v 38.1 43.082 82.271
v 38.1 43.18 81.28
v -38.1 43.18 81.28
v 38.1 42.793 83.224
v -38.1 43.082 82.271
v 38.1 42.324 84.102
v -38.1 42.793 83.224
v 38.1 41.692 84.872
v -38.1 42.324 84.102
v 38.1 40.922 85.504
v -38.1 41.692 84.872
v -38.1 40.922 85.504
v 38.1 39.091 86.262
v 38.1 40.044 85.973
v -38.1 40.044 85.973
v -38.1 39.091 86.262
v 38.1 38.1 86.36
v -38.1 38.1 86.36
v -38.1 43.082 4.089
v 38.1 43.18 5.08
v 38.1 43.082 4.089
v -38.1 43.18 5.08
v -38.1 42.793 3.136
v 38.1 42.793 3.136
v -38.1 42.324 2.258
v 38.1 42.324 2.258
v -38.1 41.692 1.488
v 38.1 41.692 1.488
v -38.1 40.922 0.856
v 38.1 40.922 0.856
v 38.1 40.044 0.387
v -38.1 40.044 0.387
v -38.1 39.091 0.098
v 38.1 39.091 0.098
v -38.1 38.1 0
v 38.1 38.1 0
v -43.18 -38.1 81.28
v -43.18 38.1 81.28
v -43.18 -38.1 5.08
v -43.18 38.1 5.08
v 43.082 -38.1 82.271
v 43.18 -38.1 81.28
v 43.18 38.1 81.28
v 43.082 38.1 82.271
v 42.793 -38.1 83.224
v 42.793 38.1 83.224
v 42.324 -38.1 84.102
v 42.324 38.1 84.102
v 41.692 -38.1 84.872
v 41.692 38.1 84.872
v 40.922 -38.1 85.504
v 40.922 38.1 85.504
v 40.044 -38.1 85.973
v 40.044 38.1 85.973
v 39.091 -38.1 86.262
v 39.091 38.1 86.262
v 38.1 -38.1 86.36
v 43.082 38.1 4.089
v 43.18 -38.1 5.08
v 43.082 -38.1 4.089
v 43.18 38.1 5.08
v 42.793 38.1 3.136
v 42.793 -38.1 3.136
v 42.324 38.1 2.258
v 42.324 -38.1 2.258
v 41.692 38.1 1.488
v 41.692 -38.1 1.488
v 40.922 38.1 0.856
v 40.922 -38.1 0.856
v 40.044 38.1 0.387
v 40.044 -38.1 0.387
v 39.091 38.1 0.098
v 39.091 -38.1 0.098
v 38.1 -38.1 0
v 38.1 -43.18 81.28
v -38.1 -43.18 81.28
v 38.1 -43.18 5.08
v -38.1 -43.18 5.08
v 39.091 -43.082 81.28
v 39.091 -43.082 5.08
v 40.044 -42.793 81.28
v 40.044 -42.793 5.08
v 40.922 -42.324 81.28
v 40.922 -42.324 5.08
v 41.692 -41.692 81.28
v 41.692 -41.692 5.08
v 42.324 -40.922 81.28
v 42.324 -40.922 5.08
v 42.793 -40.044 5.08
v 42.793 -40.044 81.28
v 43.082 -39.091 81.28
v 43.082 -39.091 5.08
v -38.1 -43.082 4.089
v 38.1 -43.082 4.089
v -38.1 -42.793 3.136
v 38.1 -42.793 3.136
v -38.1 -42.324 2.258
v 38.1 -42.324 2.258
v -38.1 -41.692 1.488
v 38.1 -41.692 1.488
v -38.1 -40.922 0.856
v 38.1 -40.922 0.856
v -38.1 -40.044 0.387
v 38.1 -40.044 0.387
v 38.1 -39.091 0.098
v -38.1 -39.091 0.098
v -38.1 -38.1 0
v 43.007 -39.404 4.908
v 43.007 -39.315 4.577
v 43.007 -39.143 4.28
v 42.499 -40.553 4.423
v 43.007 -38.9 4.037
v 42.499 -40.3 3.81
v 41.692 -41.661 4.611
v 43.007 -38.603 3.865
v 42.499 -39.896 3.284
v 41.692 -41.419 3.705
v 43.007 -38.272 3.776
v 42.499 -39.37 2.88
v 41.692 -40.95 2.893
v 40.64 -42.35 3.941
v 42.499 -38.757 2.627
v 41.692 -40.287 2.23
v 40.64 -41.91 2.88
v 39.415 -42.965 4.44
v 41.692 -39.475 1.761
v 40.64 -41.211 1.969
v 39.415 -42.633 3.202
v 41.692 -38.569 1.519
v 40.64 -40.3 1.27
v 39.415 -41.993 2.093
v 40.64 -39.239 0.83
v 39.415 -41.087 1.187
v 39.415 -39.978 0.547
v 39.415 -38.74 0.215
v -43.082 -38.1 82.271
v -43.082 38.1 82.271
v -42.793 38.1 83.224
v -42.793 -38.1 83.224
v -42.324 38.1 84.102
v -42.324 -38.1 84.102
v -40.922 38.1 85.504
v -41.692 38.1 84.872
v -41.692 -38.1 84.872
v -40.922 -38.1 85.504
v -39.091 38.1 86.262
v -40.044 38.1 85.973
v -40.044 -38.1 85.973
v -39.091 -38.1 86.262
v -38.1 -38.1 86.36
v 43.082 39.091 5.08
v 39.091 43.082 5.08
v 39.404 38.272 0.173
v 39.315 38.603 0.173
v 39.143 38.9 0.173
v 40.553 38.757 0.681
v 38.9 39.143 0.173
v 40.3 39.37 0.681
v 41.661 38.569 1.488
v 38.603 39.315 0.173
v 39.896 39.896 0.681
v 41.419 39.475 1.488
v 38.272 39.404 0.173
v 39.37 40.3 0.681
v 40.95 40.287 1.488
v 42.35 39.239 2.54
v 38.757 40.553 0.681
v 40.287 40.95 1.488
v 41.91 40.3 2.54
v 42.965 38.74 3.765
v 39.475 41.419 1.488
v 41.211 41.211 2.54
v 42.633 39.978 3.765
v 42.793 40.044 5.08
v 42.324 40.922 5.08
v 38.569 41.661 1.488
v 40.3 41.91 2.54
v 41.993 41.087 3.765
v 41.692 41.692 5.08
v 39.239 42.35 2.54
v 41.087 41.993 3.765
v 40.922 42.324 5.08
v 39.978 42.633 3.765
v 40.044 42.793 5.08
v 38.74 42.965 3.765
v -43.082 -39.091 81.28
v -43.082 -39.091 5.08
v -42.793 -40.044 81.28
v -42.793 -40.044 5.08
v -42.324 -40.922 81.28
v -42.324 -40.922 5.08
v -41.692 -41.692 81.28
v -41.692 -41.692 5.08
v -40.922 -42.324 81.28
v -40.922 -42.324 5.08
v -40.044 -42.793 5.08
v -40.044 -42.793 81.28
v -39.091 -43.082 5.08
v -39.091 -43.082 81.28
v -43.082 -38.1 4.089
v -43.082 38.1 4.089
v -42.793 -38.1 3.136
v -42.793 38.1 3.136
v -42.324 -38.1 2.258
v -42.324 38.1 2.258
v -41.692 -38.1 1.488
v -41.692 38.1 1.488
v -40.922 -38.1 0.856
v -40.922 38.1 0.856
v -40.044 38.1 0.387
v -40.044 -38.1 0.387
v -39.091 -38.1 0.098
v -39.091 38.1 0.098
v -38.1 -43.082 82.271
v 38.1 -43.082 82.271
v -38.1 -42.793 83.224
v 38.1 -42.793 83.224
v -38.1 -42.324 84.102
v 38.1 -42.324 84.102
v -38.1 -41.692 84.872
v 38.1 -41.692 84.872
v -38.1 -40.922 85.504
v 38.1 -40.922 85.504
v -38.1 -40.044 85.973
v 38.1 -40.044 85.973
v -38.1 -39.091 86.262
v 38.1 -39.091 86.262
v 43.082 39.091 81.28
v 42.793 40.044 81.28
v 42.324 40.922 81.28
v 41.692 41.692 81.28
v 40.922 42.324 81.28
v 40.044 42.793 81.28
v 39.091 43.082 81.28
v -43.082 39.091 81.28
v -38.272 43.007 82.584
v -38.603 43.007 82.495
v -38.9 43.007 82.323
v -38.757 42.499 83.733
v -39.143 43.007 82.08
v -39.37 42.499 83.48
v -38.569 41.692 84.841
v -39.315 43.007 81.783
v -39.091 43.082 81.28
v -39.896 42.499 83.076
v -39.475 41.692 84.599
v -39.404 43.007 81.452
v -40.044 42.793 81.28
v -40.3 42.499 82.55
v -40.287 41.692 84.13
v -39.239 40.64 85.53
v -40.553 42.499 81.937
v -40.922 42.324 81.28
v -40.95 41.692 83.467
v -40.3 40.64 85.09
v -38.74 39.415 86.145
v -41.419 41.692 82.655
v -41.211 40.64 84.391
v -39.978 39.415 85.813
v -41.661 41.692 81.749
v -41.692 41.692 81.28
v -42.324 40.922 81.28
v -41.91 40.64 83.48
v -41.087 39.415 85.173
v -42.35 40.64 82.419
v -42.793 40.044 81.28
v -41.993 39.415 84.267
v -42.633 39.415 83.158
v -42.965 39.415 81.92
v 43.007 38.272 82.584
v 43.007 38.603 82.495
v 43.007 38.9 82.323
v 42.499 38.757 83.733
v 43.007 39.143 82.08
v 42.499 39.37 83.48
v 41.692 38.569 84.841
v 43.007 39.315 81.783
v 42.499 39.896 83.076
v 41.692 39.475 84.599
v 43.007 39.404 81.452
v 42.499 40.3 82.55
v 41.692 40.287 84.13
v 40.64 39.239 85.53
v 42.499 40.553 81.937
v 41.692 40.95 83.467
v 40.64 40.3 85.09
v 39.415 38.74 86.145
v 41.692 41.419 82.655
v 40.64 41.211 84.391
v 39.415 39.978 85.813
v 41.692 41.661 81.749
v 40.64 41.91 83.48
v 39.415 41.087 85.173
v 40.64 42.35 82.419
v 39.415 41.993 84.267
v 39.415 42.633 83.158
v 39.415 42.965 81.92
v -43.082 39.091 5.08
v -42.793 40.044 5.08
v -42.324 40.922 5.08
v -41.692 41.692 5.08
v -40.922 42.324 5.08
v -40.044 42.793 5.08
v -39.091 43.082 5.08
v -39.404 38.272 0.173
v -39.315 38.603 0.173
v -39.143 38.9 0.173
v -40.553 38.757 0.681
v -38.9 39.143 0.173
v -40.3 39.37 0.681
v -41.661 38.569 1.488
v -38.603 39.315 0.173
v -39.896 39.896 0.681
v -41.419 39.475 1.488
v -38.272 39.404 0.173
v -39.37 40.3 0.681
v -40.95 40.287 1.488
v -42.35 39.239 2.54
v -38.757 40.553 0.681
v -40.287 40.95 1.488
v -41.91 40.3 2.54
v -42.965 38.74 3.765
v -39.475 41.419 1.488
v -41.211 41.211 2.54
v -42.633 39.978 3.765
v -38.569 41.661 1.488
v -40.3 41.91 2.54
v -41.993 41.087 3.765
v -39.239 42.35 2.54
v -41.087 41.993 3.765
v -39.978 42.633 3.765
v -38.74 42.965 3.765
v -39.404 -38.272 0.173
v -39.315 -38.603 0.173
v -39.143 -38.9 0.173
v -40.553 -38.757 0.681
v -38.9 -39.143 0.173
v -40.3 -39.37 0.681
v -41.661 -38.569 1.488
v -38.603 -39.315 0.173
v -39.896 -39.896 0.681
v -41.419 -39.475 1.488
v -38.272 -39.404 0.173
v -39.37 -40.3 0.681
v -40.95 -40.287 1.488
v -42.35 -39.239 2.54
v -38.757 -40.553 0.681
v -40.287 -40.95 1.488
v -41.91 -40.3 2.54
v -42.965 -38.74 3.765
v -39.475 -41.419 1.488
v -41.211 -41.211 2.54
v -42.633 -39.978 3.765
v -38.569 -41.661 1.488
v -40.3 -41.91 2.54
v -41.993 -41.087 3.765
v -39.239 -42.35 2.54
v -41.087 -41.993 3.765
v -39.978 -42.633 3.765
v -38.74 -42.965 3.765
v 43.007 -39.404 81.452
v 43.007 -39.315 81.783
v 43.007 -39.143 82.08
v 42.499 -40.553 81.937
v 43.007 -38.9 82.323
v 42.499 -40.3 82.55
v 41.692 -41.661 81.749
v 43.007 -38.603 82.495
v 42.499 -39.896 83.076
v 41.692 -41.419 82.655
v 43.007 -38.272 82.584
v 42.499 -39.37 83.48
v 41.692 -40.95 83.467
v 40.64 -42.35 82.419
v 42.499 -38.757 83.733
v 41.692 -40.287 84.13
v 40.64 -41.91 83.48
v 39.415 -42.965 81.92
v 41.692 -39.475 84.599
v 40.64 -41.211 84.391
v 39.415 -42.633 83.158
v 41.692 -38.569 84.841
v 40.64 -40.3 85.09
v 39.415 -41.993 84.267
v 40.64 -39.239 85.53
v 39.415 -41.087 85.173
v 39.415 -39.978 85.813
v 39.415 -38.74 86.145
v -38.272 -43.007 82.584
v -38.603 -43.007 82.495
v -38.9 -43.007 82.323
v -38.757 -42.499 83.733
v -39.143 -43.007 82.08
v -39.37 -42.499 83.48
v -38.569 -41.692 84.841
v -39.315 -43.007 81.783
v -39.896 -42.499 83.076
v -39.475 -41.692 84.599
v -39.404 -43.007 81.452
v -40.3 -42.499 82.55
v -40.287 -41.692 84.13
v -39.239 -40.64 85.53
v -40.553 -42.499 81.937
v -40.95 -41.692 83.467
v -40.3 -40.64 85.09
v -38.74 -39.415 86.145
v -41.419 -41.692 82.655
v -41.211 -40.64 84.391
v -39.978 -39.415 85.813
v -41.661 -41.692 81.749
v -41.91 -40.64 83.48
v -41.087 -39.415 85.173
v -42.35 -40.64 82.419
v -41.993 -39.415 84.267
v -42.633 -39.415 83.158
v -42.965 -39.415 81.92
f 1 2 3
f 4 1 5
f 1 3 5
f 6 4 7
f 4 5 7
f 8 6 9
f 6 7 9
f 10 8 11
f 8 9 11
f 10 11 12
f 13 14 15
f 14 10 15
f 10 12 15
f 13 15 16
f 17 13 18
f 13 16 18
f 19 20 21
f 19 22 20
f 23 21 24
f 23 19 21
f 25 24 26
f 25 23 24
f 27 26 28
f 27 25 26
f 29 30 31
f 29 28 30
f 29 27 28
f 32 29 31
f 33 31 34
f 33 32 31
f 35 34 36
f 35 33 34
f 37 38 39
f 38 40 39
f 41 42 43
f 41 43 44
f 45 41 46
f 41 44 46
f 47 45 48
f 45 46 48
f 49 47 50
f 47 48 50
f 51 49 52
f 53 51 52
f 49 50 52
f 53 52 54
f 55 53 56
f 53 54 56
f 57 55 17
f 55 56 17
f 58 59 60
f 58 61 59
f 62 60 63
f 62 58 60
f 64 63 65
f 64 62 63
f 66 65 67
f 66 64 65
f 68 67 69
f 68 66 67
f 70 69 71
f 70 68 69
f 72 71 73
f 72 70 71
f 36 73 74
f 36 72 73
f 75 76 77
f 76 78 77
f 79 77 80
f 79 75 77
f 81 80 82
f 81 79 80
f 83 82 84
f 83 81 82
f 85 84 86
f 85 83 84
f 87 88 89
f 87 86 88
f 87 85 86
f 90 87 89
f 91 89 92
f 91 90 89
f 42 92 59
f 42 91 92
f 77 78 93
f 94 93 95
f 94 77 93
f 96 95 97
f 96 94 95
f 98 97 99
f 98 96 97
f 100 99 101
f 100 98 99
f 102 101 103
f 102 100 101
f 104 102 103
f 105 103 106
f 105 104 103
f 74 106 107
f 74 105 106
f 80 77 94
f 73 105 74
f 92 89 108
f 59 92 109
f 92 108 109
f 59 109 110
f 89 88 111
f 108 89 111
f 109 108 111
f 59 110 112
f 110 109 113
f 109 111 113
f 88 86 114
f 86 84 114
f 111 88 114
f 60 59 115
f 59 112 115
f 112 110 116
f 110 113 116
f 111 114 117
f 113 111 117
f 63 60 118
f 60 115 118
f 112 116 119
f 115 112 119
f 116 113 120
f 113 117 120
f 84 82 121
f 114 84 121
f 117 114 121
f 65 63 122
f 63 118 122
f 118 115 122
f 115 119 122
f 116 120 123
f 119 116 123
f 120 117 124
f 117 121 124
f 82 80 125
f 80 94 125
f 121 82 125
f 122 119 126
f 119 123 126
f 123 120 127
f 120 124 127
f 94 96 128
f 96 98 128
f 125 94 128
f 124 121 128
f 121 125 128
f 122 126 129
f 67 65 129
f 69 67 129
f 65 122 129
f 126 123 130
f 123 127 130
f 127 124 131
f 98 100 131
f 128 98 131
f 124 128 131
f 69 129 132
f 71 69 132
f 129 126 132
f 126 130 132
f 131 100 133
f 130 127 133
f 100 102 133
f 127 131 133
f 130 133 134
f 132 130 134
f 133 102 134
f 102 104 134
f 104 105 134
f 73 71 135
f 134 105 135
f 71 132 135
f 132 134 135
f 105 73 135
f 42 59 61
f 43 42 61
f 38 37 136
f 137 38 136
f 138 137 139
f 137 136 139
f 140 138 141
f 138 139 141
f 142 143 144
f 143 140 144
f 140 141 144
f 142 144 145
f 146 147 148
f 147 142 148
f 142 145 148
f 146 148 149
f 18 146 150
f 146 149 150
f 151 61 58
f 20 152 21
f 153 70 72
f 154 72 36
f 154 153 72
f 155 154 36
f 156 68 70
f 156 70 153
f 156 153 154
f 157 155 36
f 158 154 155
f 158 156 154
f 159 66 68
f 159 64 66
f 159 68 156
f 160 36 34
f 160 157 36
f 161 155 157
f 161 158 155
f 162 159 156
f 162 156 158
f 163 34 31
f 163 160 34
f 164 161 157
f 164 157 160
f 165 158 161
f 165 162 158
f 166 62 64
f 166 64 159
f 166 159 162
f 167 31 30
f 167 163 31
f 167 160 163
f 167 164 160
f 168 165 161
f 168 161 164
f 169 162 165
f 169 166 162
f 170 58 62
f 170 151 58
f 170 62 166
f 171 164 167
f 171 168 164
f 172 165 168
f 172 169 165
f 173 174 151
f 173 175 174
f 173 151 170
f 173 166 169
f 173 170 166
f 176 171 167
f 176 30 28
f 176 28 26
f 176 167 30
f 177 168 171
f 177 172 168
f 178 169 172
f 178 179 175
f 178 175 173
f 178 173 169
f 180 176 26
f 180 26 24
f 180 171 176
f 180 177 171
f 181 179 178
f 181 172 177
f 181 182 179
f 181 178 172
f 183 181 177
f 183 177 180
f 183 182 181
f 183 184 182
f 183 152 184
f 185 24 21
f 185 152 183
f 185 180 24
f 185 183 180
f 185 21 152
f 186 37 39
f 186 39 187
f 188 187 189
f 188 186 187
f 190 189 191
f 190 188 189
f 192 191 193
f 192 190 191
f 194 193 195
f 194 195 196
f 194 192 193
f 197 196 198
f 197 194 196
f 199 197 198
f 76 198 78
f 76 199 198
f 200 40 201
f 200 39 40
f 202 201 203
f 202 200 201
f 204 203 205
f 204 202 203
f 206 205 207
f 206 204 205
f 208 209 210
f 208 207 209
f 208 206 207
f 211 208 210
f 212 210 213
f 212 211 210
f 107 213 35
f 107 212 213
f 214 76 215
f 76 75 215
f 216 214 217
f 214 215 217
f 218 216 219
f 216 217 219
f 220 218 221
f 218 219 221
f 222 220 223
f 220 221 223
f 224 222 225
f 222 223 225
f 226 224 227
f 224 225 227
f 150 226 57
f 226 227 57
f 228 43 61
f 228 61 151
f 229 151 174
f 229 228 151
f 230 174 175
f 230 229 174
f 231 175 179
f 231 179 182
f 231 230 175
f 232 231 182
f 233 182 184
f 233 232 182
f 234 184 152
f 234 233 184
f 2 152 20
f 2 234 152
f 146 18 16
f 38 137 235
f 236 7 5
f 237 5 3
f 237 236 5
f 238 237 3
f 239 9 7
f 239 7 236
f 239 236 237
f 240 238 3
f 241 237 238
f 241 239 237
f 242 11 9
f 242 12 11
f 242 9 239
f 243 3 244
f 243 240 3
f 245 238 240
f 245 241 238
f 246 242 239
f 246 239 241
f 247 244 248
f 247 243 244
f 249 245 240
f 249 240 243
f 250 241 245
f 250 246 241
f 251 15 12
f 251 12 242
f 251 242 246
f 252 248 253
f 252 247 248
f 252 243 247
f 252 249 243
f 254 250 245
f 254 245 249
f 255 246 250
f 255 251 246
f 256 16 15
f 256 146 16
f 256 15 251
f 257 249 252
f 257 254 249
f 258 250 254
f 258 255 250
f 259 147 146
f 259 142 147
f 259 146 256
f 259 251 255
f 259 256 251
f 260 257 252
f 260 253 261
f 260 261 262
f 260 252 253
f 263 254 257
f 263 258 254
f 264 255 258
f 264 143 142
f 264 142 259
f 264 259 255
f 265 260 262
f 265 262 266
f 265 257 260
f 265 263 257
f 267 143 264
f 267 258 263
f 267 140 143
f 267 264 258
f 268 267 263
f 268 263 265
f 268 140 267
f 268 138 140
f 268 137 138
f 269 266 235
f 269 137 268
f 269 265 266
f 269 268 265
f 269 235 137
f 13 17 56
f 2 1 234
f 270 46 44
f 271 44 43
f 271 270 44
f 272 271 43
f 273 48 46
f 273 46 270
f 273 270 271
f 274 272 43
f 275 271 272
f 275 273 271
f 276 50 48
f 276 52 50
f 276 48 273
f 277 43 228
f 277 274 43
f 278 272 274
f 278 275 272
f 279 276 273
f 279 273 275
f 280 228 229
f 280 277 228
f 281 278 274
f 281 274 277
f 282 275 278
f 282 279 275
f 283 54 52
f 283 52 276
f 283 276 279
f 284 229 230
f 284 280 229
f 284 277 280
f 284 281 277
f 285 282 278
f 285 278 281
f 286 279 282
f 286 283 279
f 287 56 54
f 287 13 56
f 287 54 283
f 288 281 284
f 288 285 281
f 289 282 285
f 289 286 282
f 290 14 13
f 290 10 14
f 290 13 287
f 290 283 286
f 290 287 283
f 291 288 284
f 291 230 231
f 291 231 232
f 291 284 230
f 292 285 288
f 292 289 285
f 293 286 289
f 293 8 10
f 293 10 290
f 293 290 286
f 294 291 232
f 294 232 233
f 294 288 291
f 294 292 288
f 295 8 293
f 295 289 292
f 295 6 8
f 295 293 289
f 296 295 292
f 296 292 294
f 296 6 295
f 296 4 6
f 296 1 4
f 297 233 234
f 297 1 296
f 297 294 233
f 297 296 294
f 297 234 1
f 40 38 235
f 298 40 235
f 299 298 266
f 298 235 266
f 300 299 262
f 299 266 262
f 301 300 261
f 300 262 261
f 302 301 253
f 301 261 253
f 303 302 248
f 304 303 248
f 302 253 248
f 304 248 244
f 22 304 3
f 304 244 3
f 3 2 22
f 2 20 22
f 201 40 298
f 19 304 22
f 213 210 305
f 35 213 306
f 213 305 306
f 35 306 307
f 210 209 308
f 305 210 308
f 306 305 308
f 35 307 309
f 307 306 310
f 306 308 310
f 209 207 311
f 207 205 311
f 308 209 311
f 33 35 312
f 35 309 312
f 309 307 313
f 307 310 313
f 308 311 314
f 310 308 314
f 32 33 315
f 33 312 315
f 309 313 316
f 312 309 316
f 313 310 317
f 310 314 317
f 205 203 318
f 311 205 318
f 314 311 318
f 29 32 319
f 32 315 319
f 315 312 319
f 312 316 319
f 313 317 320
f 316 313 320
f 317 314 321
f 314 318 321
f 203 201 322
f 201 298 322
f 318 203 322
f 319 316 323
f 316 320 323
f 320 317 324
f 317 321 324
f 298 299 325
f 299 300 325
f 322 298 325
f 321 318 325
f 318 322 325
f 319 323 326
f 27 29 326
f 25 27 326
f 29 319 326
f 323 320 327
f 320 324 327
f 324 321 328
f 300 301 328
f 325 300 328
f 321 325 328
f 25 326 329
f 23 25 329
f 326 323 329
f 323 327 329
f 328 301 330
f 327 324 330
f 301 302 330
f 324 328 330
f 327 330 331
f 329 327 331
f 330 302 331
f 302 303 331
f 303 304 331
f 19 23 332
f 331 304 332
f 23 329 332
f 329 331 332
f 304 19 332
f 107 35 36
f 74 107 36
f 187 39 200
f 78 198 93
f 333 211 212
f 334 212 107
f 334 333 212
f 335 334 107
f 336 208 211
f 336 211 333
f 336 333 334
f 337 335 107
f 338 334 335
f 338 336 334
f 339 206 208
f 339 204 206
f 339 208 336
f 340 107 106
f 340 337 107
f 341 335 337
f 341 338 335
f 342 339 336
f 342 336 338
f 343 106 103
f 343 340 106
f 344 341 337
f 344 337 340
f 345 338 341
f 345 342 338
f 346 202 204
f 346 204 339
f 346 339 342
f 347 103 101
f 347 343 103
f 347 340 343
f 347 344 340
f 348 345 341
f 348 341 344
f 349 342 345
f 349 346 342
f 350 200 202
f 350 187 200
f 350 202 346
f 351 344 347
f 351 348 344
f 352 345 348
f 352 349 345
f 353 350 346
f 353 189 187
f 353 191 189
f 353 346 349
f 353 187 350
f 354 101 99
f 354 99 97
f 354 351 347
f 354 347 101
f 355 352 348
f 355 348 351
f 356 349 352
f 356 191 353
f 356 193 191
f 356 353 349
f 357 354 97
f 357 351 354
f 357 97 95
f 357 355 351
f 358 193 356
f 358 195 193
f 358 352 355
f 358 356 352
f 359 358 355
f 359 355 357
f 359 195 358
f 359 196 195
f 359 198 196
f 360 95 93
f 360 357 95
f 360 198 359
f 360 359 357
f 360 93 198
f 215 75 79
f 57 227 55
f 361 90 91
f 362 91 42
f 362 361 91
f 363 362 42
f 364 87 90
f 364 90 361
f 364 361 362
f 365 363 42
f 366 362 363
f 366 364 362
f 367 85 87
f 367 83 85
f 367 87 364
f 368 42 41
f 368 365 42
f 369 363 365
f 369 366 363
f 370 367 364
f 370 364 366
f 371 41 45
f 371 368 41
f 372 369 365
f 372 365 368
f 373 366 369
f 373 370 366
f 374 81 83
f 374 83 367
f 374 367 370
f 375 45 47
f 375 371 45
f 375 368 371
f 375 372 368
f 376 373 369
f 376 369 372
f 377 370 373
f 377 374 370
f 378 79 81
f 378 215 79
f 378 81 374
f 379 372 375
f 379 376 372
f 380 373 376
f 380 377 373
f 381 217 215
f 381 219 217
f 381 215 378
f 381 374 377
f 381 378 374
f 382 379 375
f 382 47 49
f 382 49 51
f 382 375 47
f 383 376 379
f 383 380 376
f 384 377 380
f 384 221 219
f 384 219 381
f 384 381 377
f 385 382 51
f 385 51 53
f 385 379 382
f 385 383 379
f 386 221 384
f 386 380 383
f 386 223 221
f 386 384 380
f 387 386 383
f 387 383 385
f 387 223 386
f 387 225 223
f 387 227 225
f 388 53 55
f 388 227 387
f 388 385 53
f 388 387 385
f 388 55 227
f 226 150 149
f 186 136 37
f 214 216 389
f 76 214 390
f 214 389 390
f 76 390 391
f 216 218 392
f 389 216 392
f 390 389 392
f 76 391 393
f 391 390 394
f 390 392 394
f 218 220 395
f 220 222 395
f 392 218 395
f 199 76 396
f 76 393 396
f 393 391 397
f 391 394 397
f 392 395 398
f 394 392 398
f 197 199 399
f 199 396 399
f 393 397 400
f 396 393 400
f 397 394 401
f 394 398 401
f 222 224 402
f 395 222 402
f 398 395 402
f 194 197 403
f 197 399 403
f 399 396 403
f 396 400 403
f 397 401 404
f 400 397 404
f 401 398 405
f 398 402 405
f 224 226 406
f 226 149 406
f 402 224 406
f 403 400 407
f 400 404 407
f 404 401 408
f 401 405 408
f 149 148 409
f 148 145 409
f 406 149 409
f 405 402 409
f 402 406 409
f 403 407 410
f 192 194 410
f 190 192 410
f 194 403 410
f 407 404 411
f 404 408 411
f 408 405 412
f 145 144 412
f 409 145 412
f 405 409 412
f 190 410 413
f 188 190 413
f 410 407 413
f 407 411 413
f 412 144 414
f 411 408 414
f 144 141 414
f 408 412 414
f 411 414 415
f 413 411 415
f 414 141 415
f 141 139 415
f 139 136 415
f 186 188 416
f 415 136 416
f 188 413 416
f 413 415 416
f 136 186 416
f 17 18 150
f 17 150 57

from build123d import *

# Parameters (mm, degrees)
F0_W     = 43.18
F0_H     = 43.18
F1_DEPTH = 86.36
F2_R     = 5.08


with BuildPart() as f1:
    # F0 (on Top) → F1 (new body)
    with BuildSketch(Plane.XY):
        with Locations((-21.59, 21.59)):
            Rectangle(F0_W, F0_H)
        with Locations((21.59, -21.59)):
            Rectangle(F0_W, F0_H)
        with Locations((21.59, 21.59)):
            Rectangle(F0_W, F0_H)
        with Locations((-21.59, -21.59)):
            Rectangle(F0_W, F0_H)
    extrude(amount=F1_DEPTH)

    # F2
    f2_edges = [f1.edges().sort_by_distance(p)[0] for p in [
        (-43.18, 0, 86.36),
        (0, 43.18, 86.36),
        (-43.18, 43.18, 43.18),
        (0, -43.18, 86.36),
        (-43.18, -43.18, 43.18),
        (-43.18, 0, 0),
        (0, -43.18, 0),
        (43.18, -43.18, 43.18),
        (43.18, 0, 86.36),
        (43.18, 43.18, 43.18),
        (43.18, 0, 0),
        (0, 43.18, 0),
    ]]
    fillet(f2_edges, radius=F2_R)


solid = f1.part
